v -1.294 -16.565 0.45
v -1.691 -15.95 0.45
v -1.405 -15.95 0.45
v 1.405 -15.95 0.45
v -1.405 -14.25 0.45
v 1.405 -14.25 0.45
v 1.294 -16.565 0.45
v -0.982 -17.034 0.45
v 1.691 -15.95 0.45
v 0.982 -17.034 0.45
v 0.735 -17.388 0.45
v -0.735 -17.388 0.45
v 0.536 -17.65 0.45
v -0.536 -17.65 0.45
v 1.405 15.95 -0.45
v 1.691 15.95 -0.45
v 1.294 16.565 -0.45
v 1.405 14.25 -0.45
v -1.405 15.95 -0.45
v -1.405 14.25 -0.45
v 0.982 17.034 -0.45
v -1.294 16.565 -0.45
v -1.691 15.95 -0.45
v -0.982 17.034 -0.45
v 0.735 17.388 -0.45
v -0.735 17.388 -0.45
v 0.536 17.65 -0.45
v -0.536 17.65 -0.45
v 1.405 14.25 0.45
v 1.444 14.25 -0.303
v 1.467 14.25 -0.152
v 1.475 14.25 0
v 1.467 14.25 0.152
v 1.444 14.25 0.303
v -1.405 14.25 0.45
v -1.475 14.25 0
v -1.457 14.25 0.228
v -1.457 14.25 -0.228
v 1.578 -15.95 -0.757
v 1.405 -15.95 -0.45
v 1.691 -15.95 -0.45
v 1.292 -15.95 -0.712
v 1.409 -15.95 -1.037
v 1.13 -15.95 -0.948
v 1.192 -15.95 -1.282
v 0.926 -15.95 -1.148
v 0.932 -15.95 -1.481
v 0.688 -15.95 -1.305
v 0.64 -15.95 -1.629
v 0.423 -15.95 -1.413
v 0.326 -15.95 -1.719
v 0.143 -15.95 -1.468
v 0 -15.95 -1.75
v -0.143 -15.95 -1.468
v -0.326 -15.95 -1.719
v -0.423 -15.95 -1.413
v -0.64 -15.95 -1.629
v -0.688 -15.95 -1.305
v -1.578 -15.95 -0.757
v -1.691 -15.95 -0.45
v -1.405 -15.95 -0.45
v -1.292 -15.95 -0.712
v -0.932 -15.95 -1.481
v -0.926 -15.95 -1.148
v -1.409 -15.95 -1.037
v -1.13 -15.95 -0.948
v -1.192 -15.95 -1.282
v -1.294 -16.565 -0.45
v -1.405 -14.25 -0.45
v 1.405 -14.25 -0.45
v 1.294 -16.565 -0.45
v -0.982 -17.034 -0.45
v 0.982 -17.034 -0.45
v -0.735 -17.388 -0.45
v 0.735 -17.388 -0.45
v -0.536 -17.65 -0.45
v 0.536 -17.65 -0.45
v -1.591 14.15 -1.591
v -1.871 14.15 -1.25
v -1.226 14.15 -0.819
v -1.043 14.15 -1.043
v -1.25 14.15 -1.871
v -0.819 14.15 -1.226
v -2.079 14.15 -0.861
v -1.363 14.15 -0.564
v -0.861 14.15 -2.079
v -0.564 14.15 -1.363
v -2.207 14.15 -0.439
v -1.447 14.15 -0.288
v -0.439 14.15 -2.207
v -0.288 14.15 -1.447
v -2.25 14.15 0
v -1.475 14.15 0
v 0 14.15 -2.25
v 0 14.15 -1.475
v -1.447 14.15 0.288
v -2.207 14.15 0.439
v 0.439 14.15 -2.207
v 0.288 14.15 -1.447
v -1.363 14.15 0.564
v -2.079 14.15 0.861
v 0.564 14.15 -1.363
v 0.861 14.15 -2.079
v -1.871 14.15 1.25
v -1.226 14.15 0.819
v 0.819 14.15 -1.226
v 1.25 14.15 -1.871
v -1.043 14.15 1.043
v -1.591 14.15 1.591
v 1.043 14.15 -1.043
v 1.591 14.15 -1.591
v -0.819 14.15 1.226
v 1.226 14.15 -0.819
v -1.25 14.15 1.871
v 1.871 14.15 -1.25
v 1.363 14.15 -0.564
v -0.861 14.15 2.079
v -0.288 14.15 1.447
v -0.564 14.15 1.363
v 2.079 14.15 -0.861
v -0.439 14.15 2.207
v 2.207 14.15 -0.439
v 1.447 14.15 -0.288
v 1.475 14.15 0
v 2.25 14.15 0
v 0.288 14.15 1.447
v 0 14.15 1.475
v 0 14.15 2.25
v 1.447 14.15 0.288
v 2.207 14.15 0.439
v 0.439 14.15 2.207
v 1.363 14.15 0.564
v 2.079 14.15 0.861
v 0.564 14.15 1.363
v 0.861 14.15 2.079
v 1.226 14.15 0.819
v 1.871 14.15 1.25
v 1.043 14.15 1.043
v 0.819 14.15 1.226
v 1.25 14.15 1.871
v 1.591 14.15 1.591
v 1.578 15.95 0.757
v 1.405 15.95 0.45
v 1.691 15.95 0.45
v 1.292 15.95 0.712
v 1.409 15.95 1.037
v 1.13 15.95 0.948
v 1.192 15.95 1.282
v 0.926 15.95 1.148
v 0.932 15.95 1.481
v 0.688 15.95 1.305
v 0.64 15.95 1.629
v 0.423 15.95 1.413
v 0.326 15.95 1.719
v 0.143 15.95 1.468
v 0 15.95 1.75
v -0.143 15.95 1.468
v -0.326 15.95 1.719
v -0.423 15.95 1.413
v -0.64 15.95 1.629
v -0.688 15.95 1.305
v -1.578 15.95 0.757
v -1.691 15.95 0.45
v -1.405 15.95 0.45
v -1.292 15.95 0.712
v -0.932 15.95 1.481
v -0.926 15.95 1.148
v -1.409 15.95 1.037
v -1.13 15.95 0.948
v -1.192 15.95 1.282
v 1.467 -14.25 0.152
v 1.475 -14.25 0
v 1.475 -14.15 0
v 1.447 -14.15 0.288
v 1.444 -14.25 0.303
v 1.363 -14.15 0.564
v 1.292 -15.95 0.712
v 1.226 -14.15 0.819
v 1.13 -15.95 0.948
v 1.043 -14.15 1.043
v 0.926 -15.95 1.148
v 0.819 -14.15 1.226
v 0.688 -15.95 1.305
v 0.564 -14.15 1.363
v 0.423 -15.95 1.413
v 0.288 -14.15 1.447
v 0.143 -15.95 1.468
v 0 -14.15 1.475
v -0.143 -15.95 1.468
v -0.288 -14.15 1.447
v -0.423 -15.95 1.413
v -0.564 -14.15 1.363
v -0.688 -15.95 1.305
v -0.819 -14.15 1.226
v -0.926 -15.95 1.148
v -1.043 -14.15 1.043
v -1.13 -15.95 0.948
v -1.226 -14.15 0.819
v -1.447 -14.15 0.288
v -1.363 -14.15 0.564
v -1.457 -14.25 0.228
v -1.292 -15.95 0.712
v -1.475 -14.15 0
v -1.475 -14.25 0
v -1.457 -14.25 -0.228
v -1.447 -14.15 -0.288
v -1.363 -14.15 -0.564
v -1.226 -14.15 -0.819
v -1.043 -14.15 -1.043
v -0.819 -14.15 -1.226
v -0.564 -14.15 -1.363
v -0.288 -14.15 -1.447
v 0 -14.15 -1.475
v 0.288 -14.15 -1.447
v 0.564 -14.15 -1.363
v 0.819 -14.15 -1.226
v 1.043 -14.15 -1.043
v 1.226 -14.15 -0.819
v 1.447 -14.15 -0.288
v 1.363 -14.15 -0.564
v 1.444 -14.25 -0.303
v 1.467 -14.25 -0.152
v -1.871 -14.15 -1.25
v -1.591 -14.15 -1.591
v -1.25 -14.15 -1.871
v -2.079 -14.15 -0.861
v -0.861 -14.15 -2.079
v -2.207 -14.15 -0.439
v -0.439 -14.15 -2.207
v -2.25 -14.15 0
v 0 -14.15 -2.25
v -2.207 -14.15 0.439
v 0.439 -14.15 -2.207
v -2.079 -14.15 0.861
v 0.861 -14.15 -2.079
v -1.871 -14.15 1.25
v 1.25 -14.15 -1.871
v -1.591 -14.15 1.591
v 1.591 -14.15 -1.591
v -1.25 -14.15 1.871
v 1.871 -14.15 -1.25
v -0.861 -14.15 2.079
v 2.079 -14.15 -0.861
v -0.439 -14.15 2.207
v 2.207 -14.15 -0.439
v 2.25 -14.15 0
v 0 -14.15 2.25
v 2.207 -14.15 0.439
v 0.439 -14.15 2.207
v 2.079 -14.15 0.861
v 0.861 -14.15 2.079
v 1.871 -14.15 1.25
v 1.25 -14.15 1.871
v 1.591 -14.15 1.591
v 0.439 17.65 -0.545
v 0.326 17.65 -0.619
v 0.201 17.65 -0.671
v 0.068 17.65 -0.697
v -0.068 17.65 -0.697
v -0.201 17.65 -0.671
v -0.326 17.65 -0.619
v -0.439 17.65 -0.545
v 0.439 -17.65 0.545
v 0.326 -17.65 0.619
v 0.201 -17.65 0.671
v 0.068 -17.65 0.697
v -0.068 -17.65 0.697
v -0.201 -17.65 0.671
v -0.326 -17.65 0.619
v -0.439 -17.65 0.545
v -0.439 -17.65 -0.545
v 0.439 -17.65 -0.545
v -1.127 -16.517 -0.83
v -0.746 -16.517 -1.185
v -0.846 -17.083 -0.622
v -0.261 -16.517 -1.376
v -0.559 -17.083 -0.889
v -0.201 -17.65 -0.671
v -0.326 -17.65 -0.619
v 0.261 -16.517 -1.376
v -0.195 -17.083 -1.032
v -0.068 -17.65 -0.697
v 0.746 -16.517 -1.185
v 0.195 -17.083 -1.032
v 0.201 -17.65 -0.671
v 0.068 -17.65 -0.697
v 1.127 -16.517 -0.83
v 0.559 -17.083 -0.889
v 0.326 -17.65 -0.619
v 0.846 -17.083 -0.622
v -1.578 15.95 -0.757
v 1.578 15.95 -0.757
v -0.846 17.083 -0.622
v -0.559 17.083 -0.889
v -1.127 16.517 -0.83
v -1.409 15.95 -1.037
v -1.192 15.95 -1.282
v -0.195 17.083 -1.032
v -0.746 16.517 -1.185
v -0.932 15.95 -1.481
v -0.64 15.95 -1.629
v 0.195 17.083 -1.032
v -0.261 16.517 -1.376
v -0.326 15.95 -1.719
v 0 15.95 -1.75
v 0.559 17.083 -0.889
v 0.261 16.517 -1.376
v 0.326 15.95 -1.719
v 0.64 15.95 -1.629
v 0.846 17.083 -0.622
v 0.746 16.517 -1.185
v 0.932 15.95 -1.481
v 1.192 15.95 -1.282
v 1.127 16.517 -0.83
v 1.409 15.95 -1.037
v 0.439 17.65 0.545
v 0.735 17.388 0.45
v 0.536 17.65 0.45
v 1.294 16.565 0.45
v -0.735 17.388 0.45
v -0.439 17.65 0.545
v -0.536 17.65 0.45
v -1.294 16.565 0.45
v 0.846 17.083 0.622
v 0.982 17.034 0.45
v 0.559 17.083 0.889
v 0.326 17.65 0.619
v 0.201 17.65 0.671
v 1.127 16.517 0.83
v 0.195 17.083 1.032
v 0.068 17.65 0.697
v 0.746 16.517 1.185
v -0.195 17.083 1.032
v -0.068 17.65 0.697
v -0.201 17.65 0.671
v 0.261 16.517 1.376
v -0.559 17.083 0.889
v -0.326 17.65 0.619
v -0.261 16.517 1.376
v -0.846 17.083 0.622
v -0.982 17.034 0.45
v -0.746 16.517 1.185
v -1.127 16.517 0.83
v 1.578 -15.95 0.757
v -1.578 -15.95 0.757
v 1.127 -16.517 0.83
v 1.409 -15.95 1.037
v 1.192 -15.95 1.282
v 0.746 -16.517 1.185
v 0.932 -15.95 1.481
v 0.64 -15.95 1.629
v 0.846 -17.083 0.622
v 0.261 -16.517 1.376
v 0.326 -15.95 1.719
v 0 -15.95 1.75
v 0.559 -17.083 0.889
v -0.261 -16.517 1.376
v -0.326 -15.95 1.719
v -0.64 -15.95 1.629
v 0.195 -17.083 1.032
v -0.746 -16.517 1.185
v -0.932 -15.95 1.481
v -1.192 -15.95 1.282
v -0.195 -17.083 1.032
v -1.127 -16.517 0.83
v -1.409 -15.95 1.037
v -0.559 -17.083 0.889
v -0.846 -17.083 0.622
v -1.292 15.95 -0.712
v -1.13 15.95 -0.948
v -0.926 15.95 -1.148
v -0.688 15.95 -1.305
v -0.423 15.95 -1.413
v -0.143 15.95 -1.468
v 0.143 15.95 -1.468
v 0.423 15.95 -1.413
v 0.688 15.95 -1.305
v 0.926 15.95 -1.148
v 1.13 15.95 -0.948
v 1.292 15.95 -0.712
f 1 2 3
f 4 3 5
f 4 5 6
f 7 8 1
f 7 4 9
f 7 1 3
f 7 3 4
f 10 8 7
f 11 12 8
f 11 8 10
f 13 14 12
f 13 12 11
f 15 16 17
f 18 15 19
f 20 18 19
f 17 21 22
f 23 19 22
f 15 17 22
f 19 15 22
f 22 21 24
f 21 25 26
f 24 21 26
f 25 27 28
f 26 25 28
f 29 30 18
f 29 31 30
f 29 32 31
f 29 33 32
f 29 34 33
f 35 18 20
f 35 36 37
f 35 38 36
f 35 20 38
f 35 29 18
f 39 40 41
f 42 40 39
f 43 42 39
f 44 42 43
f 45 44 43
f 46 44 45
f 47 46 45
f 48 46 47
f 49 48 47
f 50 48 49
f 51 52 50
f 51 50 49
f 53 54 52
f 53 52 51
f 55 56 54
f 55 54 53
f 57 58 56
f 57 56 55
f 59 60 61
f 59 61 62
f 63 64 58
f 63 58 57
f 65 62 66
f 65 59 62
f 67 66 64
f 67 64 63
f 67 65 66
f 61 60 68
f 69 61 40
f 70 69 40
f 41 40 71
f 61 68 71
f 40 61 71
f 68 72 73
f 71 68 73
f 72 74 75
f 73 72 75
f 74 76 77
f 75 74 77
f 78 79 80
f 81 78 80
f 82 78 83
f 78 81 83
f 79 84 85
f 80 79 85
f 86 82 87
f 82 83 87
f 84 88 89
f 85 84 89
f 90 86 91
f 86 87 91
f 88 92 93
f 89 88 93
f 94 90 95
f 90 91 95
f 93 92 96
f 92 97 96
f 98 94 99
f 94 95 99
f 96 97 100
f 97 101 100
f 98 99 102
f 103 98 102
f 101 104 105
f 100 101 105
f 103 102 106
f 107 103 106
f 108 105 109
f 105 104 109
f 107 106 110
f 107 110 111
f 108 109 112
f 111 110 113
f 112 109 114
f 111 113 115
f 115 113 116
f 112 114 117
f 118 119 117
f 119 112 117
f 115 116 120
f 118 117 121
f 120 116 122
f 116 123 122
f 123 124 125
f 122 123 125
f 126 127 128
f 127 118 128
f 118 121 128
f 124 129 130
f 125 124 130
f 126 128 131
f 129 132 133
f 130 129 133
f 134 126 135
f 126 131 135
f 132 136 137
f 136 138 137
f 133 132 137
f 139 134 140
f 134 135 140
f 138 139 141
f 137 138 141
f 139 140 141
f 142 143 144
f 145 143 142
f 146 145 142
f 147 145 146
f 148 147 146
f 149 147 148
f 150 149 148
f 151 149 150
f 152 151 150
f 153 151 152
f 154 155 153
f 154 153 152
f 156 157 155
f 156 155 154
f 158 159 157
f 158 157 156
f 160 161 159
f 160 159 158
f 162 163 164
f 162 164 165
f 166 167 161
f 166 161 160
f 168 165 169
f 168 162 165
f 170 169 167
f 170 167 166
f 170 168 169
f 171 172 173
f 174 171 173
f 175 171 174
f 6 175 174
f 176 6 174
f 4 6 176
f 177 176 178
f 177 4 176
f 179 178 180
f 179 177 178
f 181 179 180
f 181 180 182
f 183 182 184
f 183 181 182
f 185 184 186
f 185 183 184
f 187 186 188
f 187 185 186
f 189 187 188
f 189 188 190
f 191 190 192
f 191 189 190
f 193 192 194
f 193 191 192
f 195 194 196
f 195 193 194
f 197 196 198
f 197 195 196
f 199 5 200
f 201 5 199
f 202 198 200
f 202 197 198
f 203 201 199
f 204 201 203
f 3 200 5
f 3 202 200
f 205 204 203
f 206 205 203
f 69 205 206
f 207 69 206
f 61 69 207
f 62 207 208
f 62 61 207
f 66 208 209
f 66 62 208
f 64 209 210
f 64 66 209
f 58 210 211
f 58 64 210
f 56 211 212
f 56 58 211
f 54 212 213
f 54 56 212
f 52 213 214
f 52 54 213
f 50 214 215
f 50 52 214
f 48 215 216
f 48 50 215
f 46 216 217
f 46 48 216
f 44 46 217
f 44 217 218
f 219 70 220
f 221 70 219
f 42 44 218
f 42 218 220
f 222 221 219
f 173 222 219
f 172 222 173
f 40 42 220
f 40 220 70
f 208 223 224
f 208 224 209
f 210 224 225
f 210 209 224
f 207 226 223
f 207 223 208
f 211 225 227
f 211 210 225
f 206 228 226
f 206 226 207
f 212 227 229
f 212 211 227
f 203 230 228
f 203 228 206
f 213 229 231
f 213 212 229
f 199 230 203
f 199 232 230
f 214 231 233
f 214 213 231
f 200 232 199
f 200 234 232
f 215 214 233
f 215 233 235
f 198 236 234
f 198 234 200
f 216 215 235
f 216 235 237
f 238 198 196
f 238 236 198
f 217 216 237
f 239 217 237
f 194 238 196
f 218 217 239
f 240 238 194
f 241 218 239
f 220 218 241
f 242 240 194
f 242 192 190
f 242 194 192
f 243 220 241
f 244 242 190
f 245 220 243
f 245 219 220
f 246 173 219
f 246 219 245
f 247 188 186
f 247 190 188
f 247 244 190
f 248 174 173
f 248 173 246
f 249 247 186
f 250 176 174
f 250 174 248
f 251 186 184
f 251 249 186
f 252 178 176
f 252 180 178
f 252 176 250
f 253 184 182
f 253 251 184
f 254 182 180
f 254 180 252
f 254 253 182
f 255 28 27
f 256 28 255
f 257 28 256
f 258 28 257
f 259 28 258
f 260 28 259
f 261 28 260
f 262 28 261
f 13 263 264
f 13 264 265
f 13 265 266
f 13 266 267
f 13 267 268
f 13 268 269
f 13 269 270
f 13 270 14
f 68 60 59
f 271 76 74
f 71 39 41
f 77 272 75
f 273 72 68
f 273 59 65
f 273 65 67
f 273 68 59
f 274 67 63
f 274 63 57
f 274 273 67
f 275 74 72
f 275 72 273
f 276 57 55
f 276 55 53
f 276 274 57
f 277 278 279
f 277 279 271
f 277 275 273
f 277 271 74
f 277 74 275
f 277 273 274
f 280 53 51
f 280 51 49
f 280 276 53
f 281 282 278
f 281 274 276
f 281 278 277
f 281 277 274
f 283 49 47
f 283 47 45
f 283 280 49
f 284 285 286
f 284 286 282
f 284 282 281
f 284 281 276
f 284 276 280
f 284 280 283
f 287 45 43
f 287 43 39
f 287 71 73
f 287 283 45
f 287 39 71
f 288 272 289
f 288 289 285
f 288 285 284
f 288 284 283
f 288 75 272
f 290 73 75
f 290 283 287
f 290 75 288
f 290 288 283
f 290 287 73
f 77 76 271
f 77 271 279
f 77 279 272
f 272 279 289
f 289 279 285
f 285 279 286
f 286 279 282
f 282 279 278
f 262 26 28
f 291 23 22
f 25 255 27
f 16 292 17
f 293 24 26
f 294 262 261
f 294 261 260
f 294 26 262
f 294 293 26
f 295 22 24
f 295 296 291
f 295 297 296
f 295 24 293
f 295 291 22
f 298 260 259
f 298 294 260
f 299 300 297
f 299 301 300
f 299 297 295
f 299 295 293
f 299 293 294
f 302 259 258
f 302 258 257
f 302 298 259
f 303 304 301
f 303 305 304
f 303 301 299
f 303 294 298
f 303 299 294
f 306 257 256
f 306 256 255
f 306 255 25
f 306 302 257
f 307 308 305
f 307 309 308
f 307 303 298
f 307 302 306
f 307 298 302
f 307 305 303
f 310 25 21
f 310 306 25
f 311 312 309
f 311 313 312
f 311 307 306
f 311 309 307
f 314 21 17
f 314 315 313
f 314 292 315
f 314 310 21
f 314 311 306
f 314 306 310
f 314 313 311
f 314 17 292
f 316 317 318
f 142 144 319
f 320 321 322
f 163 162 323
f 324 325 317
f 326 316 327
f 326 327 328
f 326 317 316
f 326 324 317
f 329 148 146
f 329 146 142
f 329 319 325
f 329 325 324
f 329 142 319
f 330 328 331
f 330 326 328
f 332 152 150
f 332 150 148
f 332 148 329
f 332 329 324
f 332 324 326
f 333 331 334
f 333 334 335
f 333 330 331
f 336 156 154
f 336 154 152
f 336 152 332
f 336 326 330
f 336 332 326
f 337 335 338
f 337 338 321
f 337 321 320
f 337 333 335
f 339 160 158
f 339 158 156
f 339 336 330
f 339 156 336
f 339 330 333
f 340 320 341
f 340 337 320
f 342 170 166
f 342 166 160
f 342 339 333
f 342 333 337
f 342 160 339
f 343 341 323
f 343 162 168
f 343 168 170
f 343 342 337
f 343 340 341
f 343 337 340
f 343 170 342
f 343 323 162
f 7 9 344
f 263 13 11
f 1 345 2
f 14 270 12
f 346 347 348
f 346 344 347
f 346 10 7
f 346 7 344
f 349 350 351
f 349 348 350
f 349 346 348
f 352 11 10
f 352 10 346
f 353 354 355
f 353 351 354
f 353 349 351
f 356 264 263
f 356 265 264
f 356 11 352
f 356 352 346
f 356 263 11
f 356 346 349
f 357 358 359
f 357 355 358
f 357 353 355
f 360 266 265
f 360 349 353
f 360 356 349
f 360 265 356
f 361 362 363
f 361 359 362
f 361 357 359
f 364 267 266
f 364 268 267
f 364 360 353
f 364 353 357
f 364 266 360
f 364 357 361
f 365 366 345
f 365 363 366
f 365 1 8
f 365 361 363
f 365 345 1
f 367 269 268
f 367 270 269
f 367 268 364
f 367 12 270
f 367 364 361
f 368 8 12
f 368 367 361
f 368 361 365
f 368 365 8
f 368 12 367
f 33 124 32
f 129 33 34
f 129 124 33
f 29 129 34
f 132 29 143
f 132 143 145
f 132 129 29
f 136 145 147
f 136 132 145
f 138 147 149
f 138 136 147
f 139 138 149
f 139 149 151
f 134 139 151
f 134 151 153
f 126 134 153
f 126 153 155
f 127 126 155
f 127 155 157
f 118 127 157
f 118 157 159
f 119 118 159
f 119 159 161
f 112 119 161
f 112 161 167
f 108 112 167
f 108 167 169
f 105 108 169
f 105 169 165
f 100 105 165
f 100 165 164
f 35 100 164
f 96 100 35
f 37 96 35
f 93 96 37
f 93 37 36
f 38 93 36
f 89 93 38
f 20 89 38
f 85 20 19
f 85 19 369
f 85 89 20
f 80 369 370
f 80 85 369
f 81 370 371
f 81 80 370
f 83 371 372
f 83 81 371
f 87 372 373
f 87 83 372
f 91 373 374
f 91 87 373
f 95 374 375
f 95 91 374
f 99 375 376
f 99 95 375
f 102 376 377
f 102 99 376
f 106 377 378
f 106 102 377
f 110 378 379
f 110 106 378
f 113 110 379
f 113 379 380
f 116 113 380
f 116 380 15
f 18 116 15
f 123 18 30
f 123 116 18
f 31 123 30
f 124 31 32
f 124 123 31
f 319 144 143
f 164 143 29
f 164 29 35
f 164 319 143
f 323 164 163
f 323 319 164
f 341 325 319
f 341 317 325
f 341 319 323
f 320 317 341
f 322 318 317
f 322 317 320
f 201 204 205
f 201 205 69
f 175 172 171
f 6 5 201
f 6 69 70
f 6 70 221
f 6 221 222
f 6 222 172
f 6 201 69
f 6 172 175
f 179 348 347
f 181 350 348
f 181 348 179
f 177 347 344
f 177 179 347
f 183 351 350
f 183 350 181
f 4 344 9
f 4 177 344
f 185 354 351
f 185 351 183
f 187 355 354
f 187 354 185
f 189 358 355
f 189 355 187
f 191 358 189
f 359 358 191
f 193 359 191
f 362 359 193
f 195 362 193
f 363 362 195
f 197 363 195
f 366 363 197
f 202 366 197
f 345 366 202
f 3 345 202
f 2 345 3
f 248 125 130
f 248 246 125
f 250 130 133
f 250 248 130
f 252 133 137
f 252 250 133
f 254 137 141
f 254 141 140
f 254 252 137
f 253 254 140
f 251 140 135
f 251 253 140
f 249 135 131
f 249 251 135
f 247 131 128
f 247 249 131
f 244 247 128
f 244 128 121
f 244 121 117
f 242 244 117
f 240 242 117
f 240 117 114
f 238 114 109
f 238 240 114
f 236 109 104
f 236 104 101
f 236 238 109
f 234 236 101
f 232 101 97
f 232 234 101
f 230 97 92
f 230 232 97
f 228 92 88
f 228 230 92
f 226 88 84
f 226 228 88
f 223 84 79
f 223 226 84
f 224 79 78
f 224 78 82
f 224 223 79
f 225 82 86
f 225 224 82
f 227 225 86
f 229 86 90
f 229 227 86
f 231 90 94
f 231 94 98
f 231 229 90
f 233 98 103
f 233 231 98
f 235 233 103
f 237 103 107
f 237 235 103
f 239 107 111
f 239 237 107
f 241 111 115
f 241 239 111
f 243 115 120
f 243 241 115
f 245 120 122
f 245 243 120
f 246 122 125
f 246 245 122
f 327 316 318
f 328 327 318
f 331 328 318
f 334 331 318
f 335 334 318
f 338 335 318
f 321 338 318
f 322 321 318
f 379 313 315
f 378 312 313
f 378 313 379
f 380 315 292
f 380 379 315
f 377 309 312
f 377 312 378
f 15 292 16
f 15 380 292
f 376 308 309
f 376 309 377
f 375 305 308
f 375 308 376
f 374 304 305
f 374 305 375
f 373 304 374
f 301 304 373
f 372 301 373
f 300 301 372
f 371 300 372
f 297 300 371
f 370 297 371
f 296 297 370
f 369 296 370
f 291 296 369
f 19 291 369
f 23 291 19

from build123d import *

# Parameters (mm, degrees)
F0_R     = 0.7
F1_DEPTH = 17.65
F0_R_2   = 1.475
F2_DEPTH = 15.95
F0_R_3   = 2.25
F3_DEPTH = 14.15
F6_W     = 5.524591
F6_H     = 0.9
F8_DEPTH = 3.4
F7_W     = 4.841808
F7_H     = 0.9
F9_DEPTH = 3.4


with BuildPart() as f1:
    # F0 (on Front) → F1 (new body, symmetric)
    with BuildSketch(Plane.XZ):
        Circle(F0_R)
    extrude(amount=F1_DEPTH, both=True)

    # F0 (on Front) → F2 (join, symmetric)
    with BuildSketch(Plane.XZ):
        Circle(F0_R_2)
        Circle(F0_R, mode=Mode.SUBTRACT)
    extrude(amount=F2_DEPTH, both=True)

    # F0 (on Front) → F3 (join, symmetric)
    with BuildSketch(Plane.XZ):
        Circle(F0_R_3)
        Circle(F0_R_2, mode=Mode.SUBTRACT)
    extrude(amount=F3_DEPTH, both=True)

    # F4 (on Right) → F5 (revolve)
    with BuildSketch(Plane.YZ):
        Polygon((15.95, 0.7), (17.65, 0.7), (15.95, 1.75), align=None)
        Polygon((-17.65, 0.7), (-15.95, 0.7), (-15.95, 1.75), align=None)
    revolve(axis=Axis((0, 15.95, 0), (0, -1, 0)))

    # F6 (on face) → F8 (cut)
    with BuildSketch(Plane(origin=(0, 17.65, 0), x_dir=(-1, 0, 0), z_dir=(0, 1, 0))):
        with Locations((0.045305, 0)):
            Rectangle(F6_W, F6_H)
    extrude(amount=-F8_DEPTH, mode=Mode.SUBTRACT)

    # F7 (on face) → F9 (cut)
    with BuildSketch(Plane.XZ.offset(17.65)):
        Rectangle(F7_W, F7_H)
    extrude(amount=-F9_DEPTH, mode=Mode.SUBTRACT)


solid = f1.part
